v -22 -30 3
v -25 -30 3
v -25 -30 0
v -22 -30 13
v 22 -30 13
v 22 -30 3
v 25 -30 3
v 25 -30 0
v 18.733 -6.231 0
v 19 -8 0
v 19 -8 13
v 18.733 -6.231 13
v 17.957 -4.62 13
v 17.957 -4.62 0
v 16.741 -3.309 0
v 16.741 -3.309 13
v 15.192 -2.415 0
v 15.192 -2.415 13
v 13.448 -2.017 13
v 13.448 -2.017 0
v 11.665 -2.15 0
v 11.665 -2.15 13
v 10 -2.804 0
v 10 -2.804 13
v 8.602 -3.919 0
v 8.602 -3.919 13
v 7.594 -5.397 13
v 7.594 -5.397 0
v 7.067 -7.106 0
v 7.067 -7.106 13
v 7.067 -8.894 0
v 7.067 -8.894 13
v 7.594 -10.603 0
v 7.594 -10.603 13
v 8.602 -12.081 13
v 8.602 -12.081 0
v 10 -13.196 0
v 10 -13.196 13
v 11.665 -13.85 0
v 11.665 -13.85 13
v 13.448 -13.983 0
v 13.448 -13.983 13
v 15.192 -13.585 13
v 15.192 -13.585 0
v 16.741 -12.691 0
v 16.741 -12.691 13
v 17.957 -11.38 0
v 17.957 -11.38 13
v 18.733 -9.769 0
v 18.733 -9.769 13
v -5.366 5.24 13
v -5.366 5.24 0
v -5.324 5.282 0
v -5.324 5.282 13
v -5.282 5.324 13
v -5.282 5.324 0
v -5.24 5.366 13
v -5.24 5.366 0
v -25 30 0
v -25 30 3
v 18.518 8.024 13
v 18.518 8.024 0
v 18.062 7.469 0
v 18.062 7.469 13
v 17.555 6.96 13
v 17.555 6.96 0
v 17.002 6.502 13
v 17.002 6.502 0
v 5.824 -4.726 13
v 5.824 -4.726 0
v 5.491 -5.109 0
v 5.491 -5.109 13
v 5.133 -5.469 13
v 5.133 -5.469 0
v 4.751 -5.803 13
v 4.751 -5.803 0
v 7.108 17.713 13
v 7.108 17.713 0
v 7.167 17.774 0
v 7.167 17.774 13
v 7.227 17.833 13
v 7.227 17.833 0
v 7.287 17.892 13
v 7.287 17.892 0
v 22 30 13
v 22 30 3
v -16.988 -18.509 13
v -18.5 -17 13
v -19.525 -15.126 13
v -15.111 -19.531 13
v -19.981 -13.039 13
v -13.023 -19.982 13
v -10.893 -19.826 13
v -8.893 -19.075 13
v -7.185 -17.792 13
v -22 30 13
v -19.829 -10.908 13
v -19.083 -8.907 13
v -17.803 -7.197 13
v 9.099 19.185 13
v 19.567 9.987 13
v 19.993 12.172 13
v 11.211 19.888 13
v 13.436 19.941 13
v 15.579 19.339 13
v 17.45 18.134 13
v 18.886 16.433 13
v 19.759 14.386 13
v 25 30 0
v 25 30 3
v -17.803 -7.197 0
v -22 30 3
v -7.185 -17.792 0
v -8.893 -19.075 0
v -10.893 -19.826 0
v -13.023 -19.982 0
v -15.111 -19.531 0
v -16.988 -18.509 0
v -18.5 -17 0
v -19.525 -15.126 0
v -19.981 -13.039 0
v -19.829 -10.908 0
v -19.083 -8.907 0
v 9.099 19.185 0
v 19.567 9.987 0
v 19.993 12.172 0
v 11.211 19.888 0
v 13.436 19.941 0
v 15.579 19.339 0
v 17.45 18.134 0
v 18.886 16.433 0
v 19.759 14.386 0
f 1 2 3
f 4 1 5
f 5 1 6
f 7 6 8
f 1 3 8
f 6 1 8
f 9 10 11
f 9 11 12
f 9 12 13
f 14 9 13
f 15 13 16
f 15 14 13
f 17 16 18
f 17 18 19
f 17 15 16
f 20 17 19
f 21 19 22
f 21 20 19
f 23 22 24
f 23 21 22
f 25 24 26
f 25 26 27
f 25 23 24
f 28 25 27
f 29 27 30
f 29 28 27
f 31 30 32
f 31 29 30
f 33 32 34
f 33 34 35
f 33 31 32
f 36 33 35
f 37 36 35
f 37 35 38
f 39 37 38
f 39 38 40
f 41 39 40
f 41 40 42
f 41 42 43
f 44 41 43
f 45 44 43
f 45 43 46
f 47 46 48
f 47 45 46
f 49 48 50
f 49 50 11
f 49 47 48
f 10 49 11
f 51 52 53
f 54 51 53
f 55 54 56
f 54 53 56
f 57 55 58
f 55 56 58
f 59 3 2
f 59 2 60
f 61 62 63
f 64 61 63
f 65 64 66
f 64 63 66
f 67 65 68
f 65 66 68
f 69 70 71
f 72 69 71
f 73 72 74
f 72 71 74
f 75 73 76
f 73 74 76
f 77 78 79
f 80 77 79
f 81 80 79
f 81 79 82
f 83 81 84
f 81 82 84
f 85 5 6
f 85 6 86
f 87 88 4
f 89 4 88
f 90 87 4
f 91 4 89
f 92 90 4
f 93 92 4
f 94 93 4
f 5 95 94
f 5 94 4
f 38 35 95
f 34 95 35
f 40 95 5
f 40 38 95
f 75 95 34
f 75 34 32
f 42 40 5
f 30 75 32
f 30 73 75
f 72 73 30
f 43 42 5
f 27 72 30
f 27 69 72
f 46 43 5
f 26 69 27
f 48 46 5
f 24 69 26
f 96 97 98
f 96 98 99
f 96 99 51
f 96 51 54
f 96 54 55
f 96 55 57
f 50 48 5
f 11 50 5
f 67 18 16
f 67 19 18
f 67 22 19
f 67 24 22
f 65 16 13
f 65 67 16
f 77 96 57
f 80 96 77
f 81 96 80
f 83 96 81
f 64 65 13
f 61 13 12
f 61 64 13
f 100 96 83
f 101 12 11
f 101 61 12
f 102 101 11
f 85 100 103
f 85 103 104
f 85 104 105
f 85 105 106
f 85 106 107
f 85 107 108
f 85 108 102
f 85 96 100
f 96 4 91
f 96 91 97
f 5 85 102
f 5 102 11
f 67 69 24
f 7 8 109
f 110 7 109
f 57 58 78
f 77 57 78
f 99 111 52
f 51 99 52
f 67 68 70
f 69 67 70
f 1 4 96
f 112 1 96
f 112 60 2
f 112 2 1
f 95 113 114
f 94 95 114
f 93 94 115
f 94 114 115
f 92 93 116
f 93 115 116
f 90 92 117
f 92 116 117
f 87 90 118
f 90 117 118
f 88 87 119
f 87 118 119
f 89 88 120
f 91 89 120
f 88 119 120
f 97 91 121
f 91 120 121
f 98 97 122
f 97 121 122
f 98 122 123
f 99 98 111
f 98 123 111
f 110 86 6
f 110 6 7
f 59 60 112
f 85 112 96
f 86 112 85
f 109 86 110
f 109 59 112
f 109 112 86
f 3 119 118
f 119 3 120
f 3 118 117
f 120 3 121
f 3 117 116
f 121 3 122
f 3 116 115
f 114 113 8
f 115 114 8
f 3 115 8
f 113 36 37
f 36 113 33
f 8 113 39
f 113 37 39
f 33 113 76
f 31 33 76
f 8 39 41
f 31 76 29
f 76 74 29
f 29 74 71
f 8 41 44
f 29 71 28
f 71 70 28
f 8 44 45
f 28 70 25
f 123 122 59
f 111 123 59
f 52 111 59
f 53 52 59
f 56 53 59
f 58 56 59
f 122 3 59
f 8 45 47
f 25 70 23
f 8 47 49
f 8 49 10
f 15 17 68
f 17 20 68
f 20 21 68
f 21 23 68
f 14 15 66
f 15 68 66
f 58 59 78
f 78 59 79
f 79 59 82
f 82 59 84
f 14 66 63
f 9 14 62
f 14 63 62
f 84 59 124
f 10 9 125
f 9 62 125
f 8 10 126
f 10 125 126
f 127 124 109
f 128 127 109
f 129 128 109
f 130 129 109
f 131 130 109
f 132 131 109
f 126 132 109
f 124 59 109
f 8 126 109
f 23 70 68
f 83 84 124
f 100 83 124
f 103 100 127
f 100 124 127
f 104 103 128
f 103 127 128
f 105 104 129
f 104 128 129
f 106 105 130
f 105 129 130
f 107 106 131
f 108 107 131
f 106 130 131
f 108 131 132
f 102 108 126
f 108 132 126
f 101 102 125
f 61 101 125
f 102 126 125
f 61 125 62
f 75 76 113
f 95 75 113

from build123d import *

# Parameters (mm, degrees)
F0_W     = 50
F0_H     = 60
F0_R     = 6
F1_DEPTH = 13
F2_W     = 3
F2_H     = 60
F3_DEPTH = 10


with BuildPart() as f1:
    # F0 (on Top) → F1 (new body)
    with BuildSketch(Plane.XY):
        Rectangle(F0_W, F0_H)
        with Locations((13, -8)):
            Circle(F0_R, mode=Mode.SUBTRACT)
        with BuildLine():
            ThreePointArc((5.824037, -4.725525), (5.314884, -5.291693), (4.750949, -5.803317))
            Line((4.750949, -5.803317), (-7.185116, -17.791693))
            ThreePointArc((-7.185116, -17.791693), (-17.79758, -17.809016), (-17.803141, -7.196539))
            Line((-17.803141, -7.196539), (-5.365959, 5.239893))
            ThreePointArc((-5.365959, 5.239893), (-5.303141, 5.303461), (-5.23957, 5.366275))
            Line((-5.23957, 5.366275), (7.108243, 17.713344))
            ThreePointArc((7.108243, 17.713344), (7.196859, 17.803461), (7.286981, 17.892071))
            ThreePointArc((7.286981, 17.892071), (17.450432, 18.134113), (18.517909, 8.023979))
            ThreePointArc((18.517909, 8.023979), (17.814884, 7.208307), (17.002295, 6.501722))
            Line((17.002295, 6.501722), (5.824037, -4.725525))
        make_face(mode=Mode.SUBTRACT)
    extrude(amount=F1_DEPTH)

    # F2 (on face) → F3 (cut)
    with BuildSketch(Plane.XY.offset(13)):
        with Locations((-23.5, 0)):
            Rectangle(F2_W, F2_H)
        with Locations((23.5, 0)):
            Rectangle(F2_W, F2_H)
    extrude(amount=-F3_DEPTH, mode=Mode.SUBTRACT)


solid = f1.part
